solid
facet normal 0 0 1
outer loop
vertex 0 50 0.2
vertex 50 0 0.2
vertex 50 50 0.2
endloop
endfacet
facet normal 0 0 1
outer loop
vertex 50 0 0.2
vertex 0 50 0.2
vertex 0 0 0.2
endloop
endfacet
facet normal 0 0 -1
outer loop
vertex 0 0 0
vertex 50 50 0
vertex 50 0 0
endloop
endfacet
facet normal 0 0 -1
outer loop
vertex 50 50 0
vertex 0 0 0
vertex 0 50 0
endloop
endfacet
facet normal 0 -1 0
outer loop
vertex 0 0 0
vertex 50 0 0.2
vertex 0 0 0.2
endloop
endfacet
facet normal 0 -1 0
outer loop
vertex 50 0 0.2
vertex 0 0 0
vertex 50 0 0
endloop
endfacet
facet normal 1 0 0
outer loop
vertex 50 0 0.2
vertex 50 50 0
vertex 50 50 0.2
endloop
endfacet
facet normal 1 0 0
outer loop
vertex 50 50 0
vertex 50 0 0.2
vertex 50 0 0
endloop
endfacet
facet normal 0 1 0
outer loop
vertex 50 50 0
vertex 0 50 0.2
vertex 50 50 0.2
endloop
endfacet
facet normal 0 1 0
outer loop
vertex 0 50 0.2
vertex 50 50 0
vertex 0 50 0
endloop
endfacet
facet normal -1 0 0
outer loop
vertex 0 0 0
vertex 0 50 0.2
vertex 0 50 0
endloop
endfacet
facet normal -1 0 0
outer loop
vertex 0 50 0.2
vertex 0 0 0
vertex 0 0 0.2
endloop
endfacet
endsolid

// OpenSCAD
// A one-layer square: what a printer's first layer is read from. Printed with the bed
// probed first, it says whether the nozzle stands where it should over the bed: lines
// pressed flat into one sheet are right; lines round and standing apart, or not
// holding, say the nozzle is high; lines thin, see-through or scraped say it is low.
// What is read goes into the printer's first-layer offset, kept in its Print window
// (apothecary/slicer/first_layer_offset.py), and the next square says whether it was
// right.
//
// The square's front-left corner, on the bed, is the origin.

/* [Square] */
size = 50;          // [20:1:150] the square's side, mm

/* [Hidden] */
height = 0.2;       // one first layer: the printer profile's first layer

cube([size, size, height]);
